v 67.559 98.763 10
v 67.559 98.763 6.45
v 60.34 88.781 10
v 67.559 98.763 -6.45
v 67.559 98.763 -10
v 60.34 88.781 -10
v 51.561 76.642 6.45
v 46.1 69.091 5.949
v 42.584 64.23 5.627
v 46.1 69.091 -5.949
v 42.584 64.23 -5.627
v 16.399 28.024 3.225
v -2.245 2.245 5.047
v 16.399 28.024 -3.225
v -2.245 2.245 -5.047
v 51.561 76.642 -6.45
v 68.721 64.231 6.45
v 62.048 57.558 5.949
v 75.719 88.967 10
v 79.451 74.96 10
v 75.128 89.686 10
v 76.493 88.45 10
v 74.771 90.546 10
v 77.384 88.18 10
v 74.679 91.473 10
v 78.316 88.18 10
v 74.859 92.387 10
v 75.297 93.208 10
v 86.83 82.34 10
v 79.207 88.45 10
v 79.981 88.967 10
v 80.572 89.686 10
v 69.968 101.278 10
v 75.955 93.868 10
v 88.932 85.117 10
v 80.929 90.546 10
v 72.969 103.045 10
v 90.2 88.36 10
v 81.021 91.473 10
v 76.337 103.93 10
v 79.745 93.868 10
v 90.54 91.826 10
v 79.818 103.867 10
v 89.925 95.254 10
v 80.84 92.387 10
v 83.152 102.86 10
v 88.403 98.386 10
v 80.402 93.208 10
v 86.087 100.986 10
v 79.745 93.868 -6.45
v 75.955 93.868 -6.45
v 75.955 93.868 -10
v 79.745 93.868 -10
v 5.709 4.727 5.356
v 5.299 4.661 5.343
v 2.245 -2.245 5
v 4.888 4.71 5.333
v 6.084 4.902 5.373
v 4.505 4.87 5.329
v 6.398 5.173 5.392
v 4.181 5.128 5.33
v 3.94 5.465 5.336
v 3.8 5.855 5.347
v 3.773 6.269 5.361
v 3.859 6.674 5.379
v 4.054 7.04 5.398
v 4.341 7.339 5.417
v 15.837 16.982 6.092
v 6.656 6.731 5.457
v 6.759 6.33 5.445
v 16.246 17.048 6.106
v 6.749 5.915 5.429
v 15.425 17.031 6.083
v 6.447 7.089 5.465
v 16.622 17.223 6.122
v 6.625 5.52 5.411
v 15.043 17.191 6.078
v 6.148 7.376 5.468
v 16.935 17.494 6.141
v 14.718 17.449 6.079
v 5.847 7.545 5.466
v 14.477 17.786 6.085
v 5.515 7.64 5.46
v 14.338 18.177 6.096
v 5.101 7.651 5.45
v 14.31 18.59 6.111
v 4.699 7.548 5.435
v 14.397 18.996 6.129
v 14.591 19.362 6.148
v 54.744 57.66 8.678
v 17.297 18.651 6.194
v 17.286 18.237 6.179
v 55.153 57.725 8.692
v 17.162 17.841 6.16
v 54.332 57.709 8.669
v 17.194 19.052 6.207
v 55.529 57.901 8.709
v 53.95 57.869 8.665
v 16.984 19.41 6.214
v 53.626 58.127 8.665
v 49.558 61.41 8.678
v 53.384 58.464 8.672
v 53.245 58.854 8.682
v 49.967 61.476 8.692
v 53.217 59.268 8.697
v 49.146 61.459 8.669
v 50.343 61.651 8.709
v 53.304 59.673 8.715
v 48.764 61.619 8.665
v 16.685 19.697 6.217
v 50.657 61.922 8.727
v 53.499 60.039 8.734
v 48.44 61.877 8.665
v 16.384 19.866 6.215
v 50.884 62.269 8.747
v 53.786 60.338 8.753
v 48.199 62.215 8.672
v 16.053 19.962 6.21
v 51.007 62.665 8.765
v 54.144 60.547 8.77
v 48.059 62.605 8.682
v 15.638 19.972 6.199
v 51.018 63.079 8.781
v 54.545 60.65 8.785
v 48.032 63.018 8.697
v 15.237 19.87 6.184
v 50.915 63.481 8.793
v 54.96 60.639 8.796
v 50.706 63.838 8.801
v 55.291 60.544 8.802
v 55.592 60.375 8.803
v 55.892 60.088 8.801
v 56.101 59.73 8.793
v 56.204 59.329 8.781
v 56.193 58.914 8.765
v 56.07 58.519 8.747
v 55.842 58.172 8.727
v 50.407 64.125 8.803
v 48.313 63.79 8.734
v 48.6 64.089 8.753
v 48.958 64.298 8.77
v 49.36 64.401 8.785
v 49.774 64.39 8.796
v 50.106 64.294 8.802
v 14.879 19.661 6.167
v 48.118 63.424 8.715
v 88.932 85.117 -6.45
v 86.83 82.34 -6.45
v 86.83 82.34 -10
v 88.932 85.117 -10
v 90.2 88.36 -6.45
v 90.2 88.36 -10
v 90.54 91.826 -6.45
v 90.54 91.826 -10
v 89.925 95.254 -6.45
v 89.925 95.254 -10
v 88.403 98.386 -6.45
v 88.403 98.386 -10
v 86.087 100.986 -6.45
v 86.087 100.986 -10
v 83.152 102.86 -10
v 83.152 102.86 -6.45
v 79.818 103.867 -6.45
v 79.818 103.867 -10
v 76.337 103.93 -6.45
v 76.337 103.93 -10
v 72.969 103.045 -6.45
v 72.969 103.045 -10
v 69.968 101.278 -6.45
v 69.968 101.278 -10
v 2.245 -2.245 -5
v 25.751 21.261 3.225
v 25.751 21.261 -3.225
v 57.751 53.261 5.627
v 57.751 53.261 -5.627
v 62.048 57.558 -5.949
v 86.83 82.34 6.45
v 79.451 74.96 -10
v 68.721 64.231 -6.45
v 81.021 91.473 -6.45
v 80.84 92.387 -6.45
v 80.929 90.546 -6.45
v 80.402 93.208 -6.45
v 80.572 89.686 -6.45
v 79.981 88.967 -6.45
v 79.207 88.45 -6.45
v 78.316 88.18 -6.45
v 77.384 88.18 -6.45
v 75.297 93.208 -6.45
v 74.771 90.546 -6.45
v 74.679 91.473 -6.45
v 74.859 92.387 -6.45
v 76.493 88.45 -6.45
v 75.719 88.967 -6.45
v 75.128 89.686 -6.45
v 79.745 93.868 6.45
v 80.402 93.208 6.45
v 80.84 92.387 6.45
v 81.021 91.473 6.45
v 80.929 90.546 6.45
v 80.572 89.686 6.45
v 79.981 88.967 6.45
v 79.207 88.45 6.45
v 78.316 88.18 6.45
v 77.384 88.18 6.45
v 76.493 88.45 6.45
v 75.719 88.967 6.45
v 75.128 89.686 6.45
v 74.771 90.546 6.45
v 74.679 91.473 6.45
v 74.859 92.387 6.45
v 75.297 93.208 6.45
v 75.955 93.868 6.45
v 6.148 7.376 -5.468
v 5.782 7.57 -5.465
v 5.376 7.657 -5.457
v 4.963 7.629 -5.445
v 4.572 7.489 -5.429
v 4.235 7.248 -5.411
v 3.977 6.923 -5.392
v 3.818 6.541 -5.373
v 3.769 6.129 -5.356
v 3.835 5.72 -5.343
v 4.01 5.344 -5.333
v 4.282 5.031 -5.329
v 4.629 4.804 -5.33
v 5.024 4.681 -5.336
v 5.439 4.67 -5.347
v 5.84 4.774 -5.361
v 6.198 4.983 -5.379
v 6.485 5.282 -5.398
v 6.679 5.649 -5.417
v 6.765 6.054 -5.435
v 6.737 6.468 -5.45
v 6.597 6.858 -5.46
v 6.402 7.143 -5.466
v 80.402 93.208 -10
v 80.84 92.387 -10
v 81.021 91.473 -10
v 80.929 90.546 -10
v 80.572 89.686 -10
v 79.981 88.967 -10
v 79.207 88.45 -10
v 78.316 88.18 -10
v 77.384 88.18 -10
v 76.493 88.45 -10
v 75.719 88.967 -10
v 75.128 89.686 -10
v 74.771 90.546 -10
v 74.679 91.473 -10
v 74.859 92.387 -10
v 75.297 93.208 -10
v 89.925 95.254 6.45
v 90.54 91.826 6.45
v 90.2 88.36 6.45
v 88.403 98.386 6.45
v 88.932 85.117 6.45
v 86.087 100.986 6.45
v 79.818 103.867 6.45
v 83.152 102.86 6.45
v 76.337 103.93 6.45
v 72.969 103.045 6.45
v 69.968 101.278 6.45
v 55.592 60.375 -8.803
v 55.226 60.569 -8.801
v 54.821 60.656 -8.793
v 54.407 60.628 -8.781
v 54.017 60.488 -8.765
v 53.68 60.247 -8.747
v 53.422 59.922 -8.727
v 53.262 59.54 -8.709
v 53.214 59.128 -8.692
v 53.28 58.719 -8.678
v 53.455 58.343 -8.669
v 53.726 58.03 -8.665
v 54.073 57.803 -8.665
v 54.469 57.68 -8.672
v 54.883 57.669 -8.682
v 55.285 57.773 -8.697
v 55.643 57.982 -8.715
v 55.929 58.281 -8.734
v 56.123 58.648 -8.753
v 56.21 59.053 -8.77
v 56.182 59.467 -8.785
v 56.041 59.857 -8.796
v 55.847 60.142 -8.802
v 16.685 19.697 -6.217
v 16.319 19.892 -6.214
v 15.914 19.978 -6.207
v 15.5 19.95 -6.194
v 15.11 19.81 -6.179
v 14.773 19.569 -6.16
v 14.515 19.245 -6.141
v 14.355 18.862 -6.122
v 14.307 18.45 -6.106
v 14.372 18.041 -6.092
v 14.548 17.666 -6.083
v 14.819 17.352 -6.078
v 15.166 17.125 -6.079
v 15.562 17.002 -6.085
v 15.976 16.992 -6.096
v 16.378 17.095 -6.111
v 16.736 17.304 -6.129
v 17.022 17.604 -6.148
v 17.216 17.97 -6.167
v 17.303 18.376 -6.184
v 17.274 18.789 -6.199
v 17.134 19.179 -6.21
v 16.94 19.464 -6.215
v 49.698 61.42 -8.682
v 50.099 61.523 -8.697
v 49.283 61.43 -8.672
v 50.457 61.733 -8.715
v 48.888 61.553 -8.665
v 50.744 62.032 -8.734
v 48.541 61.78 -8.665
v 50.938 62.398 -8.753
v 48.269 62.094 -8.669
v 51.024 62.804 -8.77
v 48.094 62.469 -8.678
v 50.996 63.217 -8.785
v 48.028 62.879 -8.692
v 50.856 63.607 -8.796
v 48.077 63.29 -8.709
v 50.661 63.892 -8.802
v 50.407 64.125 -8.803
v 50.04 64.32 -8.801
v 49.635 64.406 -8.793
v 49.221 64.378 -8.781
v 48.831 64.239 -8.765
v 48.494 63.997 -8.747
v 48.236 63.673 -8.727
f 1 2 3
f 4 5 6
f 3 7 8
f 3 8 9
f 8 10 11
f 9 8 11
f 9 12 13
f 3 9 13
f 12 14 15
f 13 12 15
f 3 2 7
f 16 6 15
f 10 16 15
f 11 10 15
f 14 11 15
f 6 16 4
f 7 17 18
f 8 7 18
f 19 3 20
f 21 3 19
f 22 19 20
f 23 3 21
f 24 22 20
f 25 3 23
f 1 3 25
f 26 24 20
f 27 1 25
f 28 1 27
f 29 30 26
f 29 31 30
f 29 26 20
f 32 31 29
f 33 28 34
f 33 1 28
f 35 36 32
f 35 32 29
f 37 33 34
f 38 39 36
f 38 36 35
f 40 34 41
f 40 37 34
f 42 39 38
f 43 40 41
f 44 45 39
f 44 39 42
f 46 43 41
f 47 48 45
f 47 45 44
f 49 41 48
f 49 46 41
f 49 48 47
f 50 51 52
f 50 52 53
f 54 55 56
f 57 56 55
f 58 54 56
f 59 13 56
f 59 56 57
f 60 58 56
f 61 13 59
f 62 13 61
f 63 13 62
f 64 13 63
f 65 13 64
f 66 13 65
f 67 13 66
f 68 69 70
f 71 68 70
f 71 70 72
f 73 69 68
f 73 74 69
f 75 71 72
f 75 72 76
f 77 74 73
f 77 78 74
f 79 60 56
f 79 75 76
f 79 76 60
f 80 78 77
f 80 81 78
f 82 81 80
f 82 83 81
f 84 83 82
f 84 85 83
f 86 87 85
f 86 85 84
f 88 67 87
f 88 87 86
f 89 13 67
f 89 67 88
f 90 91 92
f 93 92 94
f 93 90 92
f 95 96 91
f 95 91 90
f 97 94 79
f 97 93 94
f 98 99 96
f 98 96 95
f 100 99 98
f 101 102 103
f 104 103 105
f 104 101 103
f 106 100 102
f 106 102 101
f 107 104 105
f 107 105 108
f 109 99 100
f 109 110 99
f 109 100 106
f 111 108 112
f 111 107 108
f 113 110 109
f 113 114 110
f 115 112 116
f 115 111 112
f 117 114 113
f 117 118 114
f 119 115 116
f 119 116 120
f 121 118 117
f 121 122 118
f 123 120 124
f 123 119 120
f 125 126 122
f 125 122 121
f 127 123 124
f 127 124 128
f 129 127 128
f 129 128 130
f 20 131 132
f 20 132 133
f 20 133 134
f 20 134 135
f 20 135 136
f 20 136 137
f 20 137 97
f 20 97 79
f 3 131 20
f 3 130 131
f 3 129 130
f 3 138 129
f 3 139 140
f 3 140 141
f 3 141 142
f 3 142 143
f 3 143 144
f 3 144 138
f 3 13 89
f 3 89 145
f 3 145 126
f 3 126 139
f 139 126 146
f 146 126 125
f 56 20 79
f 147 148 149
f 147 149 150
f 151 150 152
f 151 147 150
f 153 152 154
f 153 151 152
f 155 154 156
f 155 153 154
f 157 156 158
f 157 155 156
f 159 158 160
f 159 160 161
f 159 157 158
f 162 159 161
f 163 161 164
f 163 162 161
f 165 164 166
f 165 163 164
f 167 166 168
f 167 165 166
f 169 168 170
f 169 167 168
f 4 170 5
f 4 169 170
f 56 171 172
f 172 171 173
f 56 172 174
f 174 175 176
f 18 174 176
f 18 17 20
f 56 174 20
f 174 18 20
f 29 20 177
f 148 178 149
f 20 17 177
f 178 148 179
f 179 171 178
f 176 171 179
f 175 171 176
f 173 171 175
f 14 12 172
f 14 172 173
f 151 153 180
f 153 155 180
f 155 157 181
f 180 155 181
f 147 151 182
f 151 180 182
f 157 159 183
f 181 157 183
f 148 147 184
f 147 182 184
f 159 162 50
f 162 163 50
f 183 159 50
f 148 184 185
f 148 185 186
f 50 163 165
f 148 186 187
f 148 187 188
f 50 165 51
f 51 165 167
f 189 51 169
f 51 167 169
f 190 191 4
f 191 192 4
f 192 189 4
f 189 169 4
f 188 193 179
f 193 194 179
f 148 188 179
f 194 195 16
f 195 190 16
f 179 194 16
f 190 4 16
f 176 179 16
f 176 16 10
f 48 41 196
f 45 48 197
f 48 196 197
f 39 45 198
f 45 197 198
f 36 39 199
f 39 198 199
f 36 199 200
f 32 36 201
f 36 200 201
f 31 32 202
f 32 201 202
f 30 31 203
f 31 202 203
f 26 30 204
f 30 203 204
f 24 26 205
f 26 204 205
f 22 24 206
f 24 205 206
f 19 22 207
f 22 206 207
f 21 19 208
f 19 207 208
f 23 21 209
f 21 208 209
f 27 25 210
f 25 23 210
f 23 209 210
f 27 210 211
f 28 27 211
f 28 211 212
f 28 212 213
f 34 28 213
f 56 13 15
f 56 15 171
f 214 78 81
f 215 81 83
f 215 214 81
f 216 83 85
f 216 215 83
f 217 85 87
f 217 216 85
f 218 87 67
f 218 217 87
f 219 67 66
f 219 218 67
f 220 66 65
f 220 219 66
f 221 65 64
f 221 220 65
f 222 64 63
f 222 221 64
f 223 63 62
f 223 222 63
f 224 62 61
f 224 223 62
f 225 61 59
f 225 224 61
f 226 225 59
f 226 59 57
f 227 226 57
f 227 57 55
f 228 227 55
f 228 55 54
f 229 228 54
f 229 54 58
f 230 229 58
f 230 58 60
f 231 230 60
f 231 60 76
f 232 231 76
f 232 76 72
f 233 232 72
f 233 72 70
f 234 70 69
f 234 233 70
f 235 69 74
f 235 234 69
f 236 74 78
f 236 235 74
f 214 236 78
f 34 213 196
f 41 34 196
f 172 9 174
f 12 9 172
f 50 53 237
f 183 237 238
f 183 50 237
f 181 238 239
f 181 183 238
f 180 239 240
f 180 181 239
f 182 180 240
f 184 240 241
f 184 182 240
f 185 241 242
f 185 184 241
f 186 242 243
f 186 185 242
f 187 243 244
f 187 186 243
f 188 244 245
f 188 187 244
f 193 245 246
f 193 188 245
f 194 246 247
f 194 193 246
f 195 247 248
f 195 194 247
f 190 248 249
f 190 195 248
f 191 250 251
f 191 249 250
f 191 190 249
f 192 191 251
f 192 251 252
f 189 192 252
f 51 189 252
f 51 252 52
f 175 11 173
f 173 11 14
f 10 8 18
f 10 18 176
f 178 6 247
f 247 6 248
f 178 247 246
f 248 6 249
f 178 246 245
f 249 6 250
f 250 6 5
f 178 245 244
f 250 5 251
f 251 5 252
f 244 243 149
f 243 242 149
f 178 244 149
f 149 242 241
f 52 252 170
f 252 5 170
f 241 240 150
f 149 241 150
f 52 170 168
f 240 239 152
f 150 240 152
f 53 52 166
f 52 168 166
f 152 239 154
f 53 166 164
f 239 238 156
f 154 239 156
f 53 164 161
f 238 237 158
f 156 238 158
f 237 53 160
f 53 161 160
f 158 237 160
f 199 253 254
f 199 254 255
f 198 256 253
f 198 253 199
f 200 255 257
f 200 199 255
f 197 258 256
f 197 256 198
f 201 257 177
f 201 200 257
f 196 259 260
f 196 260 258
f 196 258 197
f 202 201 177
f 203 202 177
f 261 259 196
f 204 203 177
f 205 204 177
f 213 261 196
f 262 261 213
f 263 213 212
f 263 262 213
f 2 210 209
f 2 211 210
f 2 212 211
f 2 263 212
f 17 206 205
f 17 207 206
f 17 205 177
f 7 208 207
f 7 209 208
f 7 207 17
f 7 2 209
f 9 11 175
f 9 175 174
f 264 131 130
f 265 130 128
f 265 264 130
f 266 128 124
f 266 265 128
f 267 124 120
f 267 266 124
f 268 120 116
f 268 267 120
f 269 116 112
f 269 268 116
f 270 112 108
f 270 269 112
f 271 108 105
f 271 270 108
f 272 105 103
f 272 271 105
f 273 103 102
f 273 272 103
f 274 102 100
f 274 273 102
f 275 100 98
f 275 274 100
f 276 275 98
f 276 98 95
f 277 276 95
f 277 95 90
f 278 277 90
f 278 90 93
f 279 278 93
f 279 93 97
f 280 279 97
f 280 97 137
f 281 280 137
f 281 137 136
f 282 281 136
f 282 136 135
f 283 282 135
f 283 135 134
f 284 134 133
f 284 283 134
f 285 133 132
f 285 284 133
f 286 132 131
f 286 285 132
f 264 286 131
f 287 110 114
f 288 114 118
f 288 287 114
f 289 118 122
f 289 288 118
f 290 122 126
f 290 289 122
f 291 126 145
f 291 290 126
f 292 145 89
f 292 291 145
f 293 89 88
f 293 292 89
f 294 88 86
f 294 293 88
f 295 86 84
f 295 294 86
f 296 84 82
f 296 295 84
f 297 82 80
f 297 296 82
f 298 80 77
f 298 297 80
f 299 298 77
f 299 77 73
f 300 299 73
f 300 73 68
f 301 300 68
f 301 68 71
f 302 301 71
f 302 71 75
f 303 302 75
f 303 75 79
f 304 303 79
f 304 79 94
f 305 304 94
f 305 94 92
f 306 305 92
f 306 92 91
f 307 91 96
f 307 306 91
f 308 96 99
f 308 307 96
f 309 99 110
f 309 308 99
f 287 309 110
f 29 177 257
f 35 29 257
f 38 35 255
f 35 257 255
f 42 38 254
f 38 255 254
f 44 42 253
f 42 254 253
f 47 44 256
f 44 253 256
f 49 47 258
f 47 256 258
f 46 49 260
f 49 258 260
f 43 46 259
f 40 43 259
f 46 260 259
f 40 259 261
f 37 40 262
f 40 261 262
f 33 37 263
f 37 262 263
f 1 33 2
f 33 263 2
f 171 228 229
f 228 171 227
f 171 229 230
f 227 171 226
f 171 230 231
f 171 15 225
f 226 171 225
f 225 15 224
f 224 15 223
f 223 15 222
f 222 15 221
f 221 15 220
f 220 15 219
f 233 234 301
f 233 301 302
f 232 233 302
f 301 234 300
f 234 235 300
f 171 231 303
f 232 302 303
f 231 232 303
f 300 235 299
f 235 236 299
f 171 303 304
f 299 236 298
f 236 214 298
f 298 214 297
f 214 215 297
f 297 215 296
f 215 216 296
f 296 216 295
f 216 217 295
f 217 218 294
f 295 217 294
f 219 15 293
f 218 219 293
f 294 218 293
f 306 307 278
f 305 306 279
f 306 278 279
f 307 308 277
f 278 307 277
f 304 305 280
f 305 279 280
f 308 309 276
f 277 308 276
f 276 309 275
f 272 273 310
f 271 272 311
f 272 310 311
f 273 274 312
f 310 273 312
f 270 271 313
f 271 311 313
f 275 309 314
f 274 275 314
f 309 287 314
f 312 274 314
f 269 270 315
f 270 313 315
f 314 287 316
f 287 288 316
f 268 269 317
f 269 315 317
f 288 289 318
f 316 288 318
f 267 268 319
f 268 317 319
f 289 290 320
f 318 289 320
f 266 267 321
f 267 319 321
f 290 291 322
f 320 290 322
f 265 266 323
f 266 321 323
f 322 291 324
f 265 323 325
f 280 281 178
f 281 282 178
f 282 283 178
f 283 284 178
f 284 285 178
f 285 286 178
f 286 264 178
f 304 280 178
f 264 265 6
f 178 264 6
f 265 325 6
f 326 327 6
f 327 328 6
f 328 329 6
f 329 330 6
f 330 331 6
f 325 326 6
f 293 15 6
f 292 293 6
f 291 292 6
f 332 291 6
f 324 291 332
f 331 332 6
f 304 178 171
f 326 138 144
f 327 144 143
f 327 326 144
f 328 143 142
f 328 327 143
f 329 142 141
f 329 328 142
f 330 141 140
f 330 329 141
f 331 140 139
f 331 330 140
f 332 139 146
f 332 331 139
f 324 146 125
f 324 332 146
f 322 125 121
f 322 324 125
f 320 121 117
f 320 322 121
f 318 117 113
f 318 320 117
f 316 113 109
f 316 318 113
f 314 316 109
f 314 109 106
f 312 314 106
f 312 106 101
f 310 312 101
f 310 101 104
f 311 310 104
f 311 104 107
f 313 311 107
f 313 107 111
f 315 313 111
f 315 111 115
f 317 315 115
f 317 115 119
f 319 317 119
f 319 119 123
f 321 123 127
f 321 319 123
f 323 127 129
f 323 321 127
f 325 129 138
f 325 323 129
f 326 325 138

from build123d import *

# Parameters (mm, degrees)
BASE_VOLUME_DEPTH   = 10
WEIGHT_SAVING_REACH = 140.59
D_SHAFT_HOLE_REACH  = 140.062
TROUS_M3_DEPTH      = 139.273289153
TROUS_M3_DEPTH_BACK = 139.273289153
SKETCH15_R          = 1.5


with BuildPart() as part:
    # Sketch9 → base_volume (new body)
    with BuildSketch(Plane.XY):
        with BuildLine():
            Line((-2.24506403, 2.24506403), (2.24506403, -2.24506403))
            Line((2.24506403, -2.24506403), (86.830152477, 82.340024416))
            ThreePointArc((86.830152477, 82.340024416), (86.087387236, 100.986393717), (67.559180599, 98.762804922))
            Line((67.559180599, 98.762804922), (-2.24506403, 2.24506403))
        make_face()
    base_volume = extrude(amount=-BASE_VOLUME_DEPTH)

    # weight_saving: up to this plane
    weight_saving_end = Plane(origin=(2.24506403, -2.24506403, -10), z_dir=(0.7071067811865464, -0.7071067811865487, 0))
    # Sketch10 → weight_saving (cut, up to the surface)
    with BuildSketch(Plane(origin=(-2.540124292, 1.837086693, 0), x_dir=(0, 0, 1), z_dir=(-0.8102925792823216, 0.5860255420713356, 0)), mode=Mode.PRIVATE) as weight_saving_sk1:
        Polygon((-5, -0.503493858), (-10, 107.3), (-10, -0.503493858), align=None)
    weight_saving_tool1 = split(extrude(weight_saving_sk1.sketch, amount=-WEIGHT_SAVING_REACH, mode=Mode.PRIVATE), bisect_by=weight_saving_end, keep=Keep.BOTH, mode=Mode.PRIVATE)
    # Sketch10 → weight_saving (cut, up to the surface)
    with BuildSketch(Plane(origin=(-2.540124292, 1.837086693, 0), x_dir=(0, 0, 1), z_dir=(-0.8102925792823216, 0.5860255420713356, 0)), mode=Mode.PRIVATE) as weight_saving_sk2:
        Polygon((0, 83), (0, 132.318173369), (-6.45, 132.318173369), (-6.45, 92.318173369), (-5.949148181, 83), align=None)
    weight_saving_tool2 = split(extrude(weight_saving_sk2.sketch, amount=-WEIGHT_SAVING_REACH, mode=Mode.PRIVATE), bisect_by=weight_saving_end, keep=Keep.BOTH, mode=Mode.PRIVATE)
    # Sketch10 → weight_saving (cut, up to the surface)
    with BuildSketch(Plane(origin=(-2.540124292, 1.837086693, 0), x_dir=(0, 0, 1), z_dir=(-0.8102925792823216, 0.5860255420713356, 0)), mode=Mode.PRIVATE) as weight_saving_sk3:
        Polygon((0, 32.318173369), (0, 77), (-5.626648181, 77), (-3.225, 32.318173369), align=None)
    weight_saving_tool3 = split(extrude(weight_saving_sk3.sketch, amount=-WEIGHT_SAVING_REACH, mode=Mode.PRIVATE), bisect_by=weight_saving_end, keep=Keep.BOTH, mode=Mode.PRIVATE)
    weight_saving = weight_saving_tool1.solids().sort_by_distance((18.223349, 30.546566, -8.333333))[0] + weight_saving_tool2.solids().sort_by_distance((60.64419, 89.201506, -3.202401))[0] + weight_saving_tool3.solids().sort_by_distance((30.675578, 47.764158, -2.267214))[0]
    add(weight_saving, mode=Mode.SUBTRACT)

    # Sketch11 → D-shaft_hole (cut, up to next)
    with BuildSketch(Plane.XY.offset(-6.45), mode=Mode.PRIVATE) as d_shaft_hole_sk1:
        with BuildLine():
            Line((75.954896356, 93.86774987), (79.744896356, 93.86774987))
            ThreePointArc((79.744896356, 93.86774987), (77.849896356, 88.145280537), (75.954896356, 93.86774987))
        make_face()
    d_shaft_hole_tool1 = extrude(d_shaft_hole_sk1.sketch, amount=-D_SHAFT_HOLE_REACH, mode=Mode.PRIVATE) & part.part
    d_shaft_hole = d_shaft_hole_tool1.solids().sort_by_distance((77.849896, 91.169307, -6.45))[0]
    add(d_shaft_hole, mode=Mode.SUBTRACT)

    # Mirror1: base_volume, weight_saving, D-shaft_hole across plane
    add(base_volume.mirror(Plane.XY))
    add(weight_saving.mirror(Plane.XY), mode=Mode.SUBTRACT)
    add(d_shaft_hole.mirror(Plane.XY), mode=Mode.SUBTRACT)

    # Sketch15 → trous_m3 (cut, two sides: drawn at the far end of the back side and taken through both)
    with BuildSketch(Plane.XY.offset(-TROUS_M3_DEPTH_BACK)):
        with Locations(Location((5.268760152, 6.160633141, 0), (0, 0, 54.124527059))):
            Circle(SKETCH15_R)
        with Locations(Location((15.806280456, 18.481899424, 0), (0, 0, 54.124527059))):
            Circle(SKETCH15_R)
        with Locations(Location((49.527674377, 62.910014332, 0), (0, 0, 54.124527059))):
            Circle(SKETCH15_R)
        with Locations(Location((54.713429681, 59.159535628, 0), (0, 0, 54.124527059))):
            Circle(SKETCH15_R)
    extrude(amount=TROUS_M3_DEPTH + TROUS_M3_DEPTH_BACK, mode=Mode.SUBTRACT)


solid = part.part
